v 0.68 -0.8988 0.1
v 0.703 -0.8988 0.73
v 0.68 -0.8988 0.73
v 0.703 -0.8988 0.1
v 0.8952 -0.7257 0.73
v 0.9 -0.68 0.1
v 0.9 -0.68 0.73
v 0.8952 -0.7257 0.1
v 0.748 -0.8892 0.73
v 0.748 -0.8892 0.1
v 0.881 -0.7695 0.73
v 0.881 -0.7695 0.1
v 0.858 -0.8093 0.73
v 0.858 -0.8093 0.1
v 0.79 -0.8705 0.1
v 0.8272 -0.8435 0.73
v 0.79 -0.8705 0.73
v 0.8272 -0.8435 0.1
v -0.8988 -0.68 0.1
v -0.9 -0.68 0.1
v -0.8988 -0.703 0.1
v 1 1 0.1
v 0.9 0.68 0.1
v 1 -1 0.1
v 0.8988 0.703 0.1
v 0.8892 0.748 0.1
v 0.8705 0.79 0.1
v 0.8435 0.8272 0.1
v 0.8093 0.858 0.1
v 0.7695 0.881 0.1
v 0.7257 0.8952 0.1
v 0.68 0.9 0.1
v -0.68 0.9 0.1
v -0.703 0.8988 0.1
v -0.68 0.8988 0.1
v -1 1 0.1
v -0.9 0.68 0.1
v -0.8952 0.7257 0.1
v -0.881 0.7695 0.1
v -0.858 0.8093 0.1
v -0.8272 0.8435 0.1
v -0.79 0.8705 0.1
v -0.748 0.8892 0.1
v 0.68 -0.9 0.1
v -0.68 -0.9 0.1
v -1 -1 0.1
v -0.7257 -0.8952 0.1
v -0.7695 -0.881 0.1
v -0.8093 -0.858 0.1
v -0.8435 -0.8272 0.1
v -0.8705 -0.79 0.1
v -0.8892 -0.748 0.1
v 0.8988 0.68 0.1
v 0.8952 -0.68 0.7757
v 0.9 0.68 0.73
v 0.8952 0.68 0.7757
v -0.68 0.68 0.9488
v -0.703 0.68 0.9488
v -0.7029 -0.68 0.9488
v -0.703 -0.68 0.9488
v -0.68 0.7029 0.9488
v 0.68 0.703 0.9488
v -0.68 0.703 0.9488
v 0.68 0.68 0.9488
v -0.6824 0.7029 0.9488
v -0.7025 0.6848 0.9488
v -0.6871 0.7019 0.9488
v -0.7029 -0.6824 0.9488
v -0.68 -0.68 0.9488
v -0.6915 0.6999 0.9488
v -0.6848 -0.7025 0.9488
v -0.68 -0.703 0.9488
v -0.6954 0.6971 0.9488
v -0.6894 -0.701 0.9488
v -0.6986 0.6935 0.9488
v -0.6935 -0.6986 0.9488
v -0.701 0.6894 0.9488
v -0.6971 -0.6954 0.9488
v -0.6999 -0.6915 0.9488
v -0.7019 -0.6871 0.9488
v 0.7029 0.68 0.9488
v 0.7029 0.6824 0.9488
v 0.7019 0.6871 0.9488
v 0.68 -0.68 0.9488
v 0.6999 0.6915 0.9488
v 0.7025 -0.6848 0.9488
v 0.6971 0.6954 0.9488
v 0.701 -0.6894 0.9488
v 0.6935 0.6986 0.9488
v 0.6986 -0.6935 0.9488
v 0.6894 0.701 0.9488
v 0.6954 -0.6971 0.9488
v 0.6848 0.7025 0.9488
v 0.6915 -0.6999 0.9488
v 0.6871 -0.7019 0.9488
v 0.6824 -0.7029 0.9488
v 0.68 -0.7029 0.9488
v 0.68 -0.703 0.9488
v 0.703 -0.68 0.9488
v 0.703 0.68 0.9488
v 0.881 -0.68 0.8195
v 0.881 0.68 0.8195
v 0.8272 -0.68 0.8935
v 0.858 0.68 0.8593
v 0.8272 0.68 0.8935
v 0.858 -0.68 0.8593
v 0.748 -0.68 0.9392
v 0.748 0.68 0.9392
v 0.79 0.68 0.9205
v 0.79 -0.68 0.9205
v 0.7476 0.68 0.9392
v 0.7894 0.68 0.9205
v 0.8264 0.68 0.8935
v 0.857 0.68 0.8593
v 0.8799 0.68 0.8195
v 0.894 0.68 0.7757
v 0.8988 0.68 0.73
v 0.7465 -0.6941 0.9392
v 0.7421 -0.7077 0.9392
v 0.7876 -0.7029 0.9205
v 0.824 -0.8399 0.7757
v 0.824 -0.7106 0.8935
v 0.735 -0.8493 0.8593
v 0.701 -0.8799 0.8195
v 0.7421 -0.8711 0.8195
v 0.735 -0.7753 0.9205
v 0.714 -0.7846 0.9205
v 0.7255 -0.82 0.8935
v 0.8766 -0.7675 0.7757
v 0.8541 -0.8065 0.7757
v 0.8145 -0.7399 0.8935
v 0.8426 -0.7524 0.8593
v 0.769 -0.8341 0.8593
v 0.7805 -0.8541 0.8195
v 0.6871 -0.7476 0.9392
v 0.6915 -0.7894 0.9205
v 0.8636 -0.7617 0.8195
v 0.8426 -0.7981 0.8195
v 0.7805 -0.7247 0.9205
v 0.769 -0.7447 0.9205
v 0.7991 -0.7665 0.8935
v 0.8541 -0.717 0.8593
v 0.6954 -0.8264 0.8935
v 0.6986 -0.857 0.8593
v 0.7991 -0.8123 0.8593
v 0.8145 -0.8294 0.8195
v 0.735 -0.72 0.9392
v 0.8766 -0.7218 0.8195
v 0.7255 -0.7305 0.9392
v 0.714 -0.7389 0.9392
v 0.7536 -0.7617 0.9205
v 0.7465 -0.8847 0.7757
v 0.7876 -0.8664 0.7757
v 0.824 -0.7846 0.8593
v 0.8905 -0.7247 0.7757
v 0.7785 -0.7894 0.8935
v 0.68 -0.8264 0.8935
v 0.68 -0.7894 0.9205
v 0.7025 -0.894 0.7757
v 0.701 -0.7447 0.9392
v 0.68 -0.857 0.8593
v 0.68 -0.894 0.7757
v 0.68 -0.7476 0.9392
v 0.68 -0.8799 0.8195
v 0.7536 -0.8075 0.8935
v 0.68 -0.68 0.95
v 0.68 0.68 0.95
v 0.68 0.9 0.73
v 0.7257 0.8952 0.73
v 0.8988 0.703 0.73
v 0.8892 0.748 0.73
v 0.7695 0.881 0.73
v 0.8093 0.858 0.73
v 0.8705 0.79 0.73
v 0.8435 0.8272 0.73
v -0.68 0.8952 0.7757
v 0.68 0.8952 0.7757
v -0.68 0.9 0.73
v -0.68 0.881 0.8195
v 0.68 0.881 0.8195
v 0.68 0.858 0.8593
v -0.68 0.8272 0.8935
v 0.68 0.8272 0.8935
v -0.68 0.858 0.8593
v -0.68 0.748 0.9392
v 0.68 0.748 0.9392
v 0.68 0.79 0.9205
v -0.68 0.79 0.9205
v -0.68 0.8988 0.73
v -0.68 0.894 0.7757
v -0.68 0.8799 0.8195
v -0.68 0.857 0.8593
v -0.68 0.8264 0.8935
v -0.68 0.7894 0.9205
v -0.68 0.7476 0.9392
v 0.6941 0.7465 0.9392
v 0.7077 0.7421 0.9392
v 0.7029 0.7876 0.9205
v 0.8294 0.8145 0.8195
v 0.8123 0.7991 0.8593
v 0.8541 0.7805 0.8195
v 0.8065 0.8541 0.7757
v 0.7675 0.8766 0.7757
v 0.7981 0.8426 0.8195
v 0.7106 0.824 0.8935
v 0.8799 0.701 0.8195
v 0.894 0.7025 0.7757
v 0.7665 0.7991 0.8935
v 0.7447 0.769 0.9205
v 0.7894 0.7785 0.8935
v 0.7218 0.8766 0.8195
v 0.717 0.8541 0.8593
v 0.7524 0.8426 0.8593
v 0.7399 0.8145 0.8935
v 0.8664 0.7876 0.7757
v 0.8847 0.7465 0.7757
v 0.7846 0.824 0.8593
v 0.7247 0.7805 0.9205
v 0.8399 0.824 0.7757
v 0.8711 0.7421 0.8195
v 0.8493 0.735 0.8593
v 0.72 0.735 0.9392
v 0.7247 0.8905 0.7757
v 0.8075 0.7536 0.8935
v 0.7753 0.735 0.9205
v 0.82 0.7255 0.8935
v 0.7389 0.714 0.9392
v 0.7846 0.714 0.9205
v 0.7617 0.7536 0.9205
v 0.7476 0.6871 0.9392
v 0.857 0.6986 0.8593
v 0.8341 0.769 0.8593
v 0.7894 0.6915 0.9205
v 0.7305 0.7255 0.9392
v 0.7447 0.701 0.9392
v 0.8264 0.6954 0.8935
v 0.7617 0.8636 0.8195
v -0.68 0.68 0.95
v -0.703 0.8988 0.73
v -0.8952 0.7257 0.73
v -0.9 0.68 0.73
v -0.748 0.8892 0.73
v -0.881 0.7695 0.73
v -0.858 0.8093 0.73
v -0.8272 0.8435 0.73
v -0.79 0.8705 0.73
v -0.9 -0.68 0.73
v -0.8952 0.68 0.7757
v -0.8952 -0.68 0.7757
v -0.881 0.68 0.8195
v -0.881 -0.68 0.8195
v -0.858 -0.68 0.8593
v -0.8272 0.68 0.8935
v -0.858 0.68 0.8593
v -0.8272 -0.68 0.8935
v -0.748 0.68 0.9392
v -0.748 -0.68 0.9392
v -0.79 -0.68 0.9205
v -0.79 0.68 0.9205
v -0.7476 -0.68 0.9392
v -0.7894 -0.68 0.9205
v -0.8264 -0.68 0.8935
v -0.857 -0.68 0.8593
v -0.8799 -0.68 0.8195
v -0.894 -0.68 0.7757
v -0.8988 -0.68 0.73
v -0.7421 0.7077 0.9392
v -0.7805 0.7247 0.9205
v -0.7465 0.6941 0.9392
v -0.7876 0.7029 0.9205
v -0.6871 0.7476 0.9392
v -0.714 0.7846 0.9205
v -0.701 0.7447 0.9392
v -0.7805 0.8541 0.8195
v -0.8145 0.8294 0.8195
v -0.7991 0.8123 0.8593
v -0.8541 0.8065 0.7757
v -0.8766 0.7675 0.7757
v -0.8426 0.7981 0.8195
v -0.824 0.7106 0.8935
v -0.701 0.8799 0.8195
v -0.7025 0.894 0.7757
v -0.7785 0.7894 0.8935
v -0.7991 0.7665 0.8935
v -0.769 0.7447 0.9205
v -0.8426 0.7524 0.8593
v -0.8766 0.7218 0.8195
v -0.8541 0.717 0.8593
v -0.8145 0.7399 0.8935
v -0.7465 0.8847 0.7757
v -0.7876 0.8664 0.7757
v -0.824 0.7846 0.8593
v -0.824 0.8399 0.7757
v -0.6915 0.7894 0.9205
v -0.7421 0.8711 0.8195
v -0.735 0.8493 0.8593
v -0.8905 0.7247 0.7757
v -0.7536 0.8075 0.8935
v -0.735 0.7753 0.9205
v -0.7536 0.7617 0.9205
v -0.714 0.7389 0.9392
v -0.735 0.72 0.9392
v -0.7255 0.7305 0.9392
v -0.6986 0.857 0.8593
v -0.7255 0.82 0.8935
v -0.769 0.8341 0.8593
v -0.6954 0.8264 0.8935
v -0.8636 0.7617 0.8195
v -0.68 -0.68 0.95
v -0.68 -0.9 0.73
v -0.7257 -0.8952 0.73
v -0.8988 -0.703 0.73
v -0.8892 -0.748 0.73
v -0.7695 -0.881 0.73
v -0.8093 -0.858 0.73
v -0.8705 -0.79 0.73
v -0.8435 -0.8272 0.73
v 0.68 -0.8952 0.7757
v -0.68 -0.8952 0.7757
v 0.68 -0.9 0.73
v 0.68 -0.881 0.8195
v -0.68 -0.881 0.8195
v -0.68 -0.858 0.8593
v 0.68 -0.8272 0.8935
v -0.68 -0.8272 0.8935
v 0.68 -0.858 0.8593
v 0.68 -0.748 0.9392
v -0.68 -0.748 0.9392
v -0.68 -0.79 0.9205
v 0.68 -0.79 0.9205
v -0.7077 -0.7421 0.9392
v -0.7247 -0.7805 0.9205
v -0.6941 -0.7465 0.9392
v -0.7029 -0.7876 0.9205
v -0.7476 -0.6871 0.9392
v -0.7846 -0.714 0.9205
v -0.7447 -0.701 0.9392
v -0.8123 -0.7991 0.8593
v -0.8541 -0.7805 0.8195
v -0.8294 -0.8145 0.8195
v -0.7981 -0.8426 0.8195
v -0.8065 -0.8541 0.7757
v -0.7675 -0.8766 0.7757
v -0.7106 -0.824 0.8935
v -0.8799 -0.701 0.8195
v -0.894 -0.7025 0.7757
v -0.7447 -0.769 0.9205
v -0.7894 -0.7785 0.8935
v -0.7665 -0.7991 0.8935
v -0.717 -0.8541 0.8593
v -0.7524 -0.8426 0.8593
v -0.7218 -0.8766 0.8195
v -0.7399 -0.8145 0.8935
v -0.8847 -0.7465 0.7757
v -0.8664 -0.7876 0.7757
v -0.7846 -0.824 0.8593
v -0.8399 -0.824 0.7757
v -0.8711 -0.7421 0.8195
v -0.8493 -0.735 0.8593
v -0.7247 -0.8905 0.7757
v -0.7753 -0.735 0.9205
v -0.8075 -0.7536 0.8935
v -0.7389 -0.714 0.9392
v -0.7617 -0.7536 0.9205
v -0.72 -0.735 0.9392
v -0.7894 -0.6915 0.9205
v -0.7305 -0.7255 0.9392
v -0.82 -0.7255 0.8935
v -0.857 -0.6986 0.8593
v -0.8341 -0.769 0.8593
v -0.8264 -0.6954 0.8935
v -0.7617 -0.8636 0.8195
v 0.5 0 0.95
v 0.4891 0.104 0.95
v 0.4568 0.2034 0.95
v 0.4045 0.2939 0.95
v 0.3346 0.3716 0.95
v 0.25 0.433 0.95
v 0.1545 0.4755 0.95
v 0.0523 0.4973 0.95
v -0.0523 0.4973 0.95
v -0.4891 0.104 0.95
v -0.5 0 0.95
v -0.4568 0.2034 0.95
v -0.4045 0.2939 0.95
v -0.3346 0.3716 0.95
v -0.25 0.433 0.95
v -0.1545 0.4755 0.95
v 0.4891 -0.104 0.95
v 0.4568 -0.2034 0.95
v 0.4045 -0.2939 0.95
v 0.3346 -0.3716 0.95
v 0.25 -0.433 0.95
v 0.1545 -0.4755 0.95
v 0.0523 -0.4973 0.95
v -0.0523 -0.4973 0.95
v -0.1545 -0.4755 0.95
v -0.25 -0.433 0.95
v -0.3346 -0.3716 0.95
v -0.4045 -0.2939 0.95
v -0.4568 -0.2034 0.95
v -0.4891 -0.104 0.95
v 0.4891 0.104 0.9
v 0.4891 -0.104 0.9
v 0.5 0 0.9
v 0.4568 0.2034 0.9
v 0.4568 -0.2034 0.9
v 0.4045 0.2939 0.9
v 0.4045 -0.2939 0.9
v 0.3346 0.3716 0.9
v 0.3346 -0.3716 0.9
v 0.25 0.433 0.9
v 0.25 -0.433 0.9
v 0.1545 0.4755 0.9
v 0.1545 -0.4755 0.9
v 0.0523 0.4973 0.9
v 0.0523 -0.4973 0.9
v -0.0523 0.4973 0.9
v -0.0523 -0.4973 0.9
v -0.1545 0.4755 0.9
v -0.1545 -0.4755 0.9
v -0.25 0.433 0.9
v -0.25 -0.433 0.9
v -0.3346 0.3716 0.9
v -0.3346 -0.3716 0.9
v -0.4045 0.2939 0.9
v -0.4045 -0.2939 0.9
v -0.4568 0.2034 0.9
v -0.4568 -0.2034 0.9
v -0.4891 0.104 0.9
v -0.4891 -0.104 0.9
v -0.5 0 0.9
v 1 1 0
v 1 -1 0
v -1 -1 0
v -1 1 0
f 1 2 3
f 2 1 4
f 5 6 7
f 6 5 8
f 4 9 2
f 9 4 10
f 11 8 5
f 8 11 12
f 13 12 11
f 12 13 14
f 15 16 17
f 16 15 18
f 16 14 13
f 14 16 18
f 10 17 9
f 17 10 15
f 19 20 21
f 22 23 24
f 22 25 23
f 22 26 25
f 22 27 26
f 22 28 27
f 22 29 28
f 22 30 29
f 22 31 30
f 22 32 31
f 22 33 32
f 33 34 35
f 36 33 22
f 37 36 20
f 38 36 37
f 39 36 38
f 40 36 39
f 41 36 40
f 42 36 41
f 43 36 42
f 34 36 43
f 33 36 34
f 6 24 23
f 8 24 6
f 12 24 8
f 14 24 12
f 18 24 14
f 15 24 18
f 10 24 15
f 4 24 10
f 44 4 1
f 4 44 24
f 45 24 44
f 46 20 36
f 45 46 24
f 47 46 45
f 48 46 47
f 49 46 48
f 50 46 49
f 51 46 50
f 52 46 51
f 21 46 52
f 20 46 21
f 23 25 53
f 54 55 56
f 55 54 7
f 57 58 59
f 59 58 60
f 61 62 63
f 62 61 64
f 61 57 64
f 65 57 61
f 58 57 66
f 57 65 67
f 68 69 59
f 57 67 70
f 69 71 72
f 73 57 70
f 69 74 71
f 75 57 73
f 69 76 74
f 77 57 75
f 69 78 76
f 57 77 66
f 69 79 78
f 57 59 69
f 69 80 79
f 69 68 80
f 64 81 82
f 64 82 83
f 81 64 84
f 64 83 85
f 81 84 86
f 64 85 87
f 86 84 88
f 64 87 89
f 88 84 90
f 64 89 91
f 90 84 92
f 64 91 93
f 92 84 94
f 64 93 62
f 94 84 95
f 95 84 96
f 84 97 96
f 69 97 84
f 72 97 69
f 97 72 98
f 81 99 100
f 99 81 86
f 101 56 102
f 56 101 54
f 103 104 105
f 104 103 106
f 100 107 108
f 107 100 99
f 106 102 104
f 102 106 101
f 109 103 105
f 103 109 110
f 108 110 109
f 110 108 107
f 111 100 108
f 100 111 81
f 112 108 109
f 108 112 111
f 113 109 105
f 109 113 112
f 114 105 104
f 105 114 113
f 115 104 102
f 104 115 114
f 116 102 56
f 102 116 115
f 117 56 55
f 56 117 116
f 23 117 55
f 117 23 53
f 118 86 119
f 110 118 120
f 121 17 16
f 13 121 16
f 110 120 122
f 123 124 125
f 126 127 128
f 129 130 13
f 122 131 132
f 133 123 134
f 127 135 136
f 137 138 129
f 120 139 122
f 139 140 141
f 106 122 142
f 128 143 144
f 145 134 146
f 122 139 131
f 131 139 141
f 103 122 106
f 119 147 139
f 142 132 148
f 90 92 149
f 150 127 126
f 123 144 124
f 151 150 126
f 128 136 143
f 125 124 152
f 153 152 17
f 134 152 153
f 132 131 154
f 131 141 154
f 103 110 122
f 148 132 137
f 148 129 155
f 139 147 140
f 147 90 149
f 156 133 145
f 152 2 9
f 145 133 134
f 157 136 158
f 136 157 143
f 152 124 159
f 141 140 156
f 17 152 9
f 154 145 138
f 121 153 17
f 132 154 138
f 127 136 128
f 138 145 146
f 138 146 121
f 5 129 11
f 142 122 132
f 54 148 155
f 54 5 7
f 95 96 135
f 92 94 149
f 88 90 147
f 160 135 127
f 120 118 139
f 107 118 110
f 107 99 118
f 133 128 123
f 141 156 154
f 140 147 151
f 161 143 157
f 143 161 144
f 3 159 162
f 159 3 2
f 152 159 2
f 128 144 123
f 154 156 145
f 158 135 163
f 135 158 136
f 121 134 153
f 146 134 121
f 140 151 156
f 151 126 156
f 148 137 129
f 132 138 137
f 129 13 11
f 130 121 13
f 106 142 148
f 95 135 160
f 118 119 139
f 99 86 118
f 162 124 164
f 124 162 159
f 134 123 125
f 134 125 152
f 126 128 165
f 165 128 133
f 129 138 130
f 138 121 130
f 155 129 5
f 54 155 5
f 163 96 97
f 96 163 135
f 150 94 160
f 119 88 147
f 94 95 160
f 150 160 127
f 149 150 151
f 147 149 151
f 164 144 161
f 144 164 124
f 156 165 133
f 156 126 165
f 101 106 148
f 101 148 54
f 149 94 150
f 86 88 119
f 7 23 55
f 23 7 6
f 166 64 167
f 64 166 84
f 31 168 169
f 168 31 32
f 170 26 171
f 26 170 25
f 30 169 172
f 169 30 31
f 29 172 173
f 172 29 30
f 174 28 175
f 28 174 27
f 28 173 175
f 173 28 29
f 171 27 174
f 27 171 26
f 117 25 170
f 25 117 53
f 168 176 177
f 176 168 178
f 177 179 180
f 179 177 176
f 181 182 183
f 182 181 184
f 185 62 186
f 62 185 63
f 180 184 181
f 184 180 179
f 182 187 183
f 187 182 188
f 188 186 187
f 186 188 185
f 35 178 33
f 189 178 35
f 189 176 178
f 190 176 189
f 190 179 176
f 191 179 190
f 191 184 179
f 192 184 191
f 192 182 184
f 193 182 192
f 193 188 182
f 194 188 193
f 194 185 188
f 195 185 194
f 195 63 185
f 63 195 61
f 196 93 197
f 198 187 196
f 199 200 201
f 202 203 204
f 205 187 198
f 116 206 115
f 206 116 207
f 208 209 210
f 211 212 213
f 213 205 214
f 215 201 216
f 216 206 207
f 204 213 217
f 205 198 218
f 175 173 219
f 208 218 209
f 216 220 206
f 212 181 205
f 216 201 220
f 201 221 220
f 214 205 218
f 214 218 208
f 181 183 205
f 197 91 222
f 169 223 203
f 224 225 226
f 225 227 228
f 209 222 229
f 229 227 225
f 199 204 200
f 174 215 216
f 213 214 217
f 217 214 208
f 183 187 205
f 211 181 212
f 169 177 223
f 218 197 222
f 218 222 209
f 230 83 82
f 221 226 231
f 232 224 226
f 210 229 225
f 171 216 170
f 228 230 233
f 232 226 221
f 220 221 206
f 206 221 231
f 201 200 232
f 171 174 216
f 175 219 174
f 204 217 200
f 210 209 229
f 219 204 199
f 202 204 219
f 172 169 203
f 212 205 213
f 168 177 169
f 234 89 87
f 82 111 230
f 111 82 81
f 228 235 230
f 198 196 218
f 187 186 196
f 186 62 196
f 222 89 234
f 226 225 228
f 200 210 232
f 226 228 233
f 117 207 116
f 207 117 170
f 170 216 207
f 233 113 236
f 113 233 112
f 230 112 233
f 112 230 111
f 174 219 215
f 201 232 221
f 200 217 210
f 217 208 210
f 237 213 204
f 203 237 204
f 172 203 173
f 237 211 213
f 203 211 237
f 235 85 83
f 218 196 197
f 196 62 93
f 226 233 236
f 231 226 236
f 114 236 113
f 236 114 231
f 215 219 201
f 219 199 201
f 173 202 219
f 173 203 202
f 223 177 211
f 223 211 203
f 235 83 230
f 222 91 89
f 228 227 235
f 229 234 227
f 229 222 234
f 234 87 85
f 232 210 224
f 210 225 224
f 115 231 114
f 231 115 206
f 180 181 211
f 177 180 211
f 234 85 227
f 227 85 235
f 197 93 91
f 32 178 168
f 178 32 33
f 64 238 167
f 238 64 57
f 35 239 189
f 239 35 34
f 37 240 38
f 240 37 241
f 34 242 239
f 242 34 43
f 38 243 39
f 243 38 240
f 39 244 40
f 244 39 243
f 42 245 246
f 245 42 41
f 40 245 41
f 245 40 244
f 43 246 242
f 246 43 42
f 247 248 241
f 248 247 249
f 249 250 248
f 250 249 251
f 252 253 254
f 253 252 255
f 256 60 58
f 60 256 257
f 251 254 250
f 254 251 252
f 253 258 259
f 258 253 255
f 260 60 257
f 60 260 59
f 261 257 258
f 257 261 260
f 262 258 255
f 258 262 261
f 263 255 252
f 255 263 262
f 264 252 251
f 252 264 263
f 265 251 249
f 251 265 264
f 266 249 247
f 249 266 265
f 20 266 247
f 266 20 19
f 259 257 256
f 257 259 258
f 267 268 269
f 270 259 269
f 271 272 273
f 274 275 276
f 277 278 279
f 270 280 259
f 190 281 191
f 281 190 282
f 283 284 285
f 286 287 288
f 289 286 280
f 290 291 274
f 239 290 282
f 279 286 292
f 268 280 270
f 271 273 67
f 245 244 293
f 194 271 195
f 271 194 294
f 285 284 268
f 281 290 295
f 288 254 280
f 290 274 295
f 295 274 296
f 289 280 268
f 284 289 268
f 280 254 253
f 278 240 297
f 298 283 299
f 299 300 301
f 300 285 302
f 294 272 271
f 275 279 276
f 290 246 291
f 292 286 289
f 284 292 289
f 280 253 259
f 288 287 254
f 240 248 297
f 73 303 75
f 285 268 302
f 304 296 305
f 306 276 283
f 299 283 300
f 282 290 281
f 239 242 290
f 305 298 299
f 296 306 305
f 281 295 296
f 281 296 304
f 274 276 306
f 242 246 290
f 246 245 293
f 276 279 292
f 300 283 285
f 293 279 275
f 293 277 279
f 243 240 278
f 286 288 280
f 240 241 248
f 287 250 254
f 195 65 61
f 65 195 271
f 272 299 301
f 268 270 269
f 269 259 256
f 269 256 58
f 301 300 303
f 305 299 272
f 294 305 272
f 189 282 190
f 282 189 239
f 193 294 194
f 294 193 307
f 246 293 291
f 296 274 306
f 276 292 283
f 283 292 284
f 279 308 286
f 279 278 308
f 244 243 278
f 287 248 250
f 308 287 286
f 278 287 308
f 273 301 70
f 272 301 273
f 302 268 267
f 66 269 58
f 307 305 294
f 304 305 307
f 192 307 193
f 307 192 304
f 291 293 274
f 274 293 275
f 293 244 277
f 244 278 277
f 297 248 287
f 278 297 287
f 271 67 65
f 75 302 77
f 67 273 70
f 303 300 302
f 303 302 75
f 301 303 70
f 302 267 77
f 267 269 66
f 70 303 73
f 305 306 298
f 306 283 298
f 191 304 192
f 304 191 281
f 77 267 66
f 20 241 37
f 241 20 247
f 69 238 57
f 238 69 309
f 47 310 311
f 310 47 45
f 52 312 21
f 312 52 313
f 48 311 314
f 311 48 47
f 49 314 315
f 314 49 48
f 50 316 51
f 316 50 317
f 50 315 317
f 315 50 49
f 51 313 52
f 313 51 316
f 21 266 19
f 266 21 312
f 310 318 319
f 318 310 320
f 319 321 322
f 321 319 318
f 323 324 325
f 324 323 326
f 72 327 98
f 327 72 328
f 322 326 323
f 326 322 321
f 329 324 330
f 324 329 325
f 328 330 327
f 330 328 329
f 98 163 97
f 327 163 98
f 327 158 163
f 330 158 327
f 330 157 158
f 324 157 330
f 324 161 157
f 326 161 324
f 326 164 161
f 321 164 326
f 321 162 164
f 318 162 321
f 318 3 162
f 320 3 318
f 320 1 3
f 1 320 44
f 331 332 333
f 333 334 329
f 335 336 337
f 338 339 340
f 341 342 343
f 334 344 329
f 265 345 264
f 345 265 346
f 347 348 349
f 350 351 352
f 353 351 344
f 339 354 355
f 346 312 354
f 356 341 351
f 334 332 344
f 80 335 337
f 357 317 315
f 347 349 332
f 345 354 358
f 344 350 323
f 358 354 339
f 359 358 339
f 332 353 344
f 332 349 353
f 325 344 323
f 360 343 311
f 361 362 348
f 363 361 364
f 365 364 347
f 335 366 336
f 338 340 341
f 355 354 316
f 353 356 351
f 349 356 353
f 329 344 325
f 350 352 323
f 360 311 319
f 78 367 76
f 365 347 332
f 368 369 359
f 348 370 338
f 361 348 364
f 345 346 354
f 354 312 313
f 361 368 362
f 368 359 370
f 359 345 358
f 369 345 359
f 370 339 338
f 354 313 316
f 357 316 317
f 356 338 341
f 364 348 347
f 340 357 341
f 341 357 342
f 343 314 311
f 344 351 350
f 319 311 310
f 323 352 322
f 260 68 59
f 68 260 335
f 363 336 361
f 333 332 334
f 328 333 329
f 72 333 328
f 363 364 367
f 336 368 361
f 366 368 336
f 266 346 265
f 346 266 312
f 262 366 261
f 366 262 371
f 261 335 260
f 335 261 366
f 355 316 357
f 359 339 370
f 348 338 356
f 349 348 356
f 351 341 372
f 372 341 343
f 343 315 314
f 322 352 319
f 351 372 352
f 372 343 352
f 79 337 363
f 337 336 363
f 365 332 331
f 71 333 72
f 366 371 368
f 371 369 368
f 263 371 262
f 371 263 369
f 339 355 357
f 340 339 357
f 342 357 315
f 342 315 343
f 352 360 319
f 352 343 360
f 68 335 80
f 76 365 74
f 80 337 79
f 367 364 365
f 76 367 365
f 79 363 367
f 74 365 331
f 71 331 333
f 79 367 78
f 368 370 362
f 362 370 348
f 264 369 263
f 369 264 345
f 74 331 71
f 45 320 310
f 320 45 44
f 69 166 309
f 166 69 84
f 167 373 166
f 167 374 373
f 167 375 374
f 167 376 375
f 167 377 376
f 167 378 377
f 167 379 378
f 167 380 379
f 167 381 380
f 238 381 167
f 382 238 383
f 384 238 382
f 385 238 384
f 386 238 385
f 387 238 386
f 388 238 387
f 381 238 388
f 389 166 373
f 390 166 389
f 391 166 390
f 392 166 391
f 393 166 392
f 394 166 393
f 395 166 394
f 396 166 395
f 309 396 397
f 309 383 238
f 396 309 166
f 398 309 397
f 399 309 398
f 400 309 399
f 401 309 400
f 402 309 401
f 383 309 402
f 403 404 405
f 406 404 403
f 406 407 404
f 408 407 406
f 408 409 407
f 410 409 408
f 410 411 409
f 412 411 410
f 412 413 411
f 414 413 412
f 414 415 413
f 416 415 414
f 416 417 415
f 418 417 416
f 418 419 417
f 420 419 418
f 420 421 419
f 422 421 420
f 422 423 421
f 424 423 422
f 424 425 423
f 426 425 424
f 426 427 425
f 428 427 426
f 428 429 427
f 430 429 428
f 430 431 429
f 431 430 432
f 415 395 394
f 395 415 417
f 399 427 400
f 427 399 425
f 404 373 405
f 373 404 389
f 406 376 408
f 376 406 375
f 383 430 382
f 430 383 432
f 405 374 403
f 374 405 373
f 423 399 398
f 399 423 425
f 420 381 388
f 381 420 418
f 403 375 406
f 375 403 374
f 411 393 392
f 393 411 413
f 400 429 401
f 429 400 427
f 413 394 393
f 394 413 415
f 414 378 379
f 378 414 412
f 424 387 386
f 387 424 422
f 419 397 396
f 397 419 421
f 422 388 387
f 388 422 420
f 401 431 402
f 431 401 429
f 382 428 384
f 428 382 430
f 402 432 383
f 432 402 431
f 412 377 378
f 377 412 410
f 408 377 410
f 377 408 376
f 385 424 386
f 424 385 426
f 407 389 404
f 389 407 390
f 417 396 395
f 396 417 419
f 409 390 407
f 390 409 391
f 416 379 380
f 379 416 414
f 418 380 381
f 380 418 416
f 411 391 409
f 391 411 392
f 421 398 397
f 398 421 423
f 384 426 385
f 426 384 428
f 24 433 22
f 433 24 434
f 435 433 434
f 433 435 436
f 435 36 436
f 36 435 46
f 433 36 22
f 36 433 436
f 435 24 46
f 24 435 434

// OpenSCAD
// Based on CAD drawing on p48/58 of BMP384 datasheet
// https://media.digikey.com/pdf/Data%20Sheets/Bosch/bst-bmp384-ds003.pdf

translate([0,0,0.05])
  color(c=[0.8,0.8,0.8])
  cube([2,2,0.1],center=true);
  
fs=0.01;

color(c=[0.8,0.8,0.8]) {  
    for(i=[0:1:3]) {
      rotate([0,0,i*90]) {
        translate([0.9-0.22,-0.9+0.22,0.1])
          cylinder(h=0.95-0.22-0.1,r=0.22,$fs=fs);
        translate([0.9-0.22,-0.9+0.22,0.95-0.22])
          rotate([-90,0,0])
            cylinder(h=2*(0.9-0.22),r=0.22,$fs=fs);
        translate([0.9-0.22,-0.9+0.22,0.95-0.22])
           sphere(0.22,$fs=fs);
        translate([0.9-0.22,-0.9+0.22,0.1])
          cube([0.22,2*(0.9-0.22),0.95-0.22-0.1]);
      }
    }
}

difference() {
  translate([0,0,(0.95-0.1)/2+0.1])
    color(c=[0.8,0.8,0.8])
     cube([1.8-0.44,1.8-0.44,0.95-0.1],center=true);
  translate([0,0,0.95-0.05])
     color(c=[0.2,0.2,0.2])
       cylinder(h=0.2,r=0.5,$fs=fs);
}
    
